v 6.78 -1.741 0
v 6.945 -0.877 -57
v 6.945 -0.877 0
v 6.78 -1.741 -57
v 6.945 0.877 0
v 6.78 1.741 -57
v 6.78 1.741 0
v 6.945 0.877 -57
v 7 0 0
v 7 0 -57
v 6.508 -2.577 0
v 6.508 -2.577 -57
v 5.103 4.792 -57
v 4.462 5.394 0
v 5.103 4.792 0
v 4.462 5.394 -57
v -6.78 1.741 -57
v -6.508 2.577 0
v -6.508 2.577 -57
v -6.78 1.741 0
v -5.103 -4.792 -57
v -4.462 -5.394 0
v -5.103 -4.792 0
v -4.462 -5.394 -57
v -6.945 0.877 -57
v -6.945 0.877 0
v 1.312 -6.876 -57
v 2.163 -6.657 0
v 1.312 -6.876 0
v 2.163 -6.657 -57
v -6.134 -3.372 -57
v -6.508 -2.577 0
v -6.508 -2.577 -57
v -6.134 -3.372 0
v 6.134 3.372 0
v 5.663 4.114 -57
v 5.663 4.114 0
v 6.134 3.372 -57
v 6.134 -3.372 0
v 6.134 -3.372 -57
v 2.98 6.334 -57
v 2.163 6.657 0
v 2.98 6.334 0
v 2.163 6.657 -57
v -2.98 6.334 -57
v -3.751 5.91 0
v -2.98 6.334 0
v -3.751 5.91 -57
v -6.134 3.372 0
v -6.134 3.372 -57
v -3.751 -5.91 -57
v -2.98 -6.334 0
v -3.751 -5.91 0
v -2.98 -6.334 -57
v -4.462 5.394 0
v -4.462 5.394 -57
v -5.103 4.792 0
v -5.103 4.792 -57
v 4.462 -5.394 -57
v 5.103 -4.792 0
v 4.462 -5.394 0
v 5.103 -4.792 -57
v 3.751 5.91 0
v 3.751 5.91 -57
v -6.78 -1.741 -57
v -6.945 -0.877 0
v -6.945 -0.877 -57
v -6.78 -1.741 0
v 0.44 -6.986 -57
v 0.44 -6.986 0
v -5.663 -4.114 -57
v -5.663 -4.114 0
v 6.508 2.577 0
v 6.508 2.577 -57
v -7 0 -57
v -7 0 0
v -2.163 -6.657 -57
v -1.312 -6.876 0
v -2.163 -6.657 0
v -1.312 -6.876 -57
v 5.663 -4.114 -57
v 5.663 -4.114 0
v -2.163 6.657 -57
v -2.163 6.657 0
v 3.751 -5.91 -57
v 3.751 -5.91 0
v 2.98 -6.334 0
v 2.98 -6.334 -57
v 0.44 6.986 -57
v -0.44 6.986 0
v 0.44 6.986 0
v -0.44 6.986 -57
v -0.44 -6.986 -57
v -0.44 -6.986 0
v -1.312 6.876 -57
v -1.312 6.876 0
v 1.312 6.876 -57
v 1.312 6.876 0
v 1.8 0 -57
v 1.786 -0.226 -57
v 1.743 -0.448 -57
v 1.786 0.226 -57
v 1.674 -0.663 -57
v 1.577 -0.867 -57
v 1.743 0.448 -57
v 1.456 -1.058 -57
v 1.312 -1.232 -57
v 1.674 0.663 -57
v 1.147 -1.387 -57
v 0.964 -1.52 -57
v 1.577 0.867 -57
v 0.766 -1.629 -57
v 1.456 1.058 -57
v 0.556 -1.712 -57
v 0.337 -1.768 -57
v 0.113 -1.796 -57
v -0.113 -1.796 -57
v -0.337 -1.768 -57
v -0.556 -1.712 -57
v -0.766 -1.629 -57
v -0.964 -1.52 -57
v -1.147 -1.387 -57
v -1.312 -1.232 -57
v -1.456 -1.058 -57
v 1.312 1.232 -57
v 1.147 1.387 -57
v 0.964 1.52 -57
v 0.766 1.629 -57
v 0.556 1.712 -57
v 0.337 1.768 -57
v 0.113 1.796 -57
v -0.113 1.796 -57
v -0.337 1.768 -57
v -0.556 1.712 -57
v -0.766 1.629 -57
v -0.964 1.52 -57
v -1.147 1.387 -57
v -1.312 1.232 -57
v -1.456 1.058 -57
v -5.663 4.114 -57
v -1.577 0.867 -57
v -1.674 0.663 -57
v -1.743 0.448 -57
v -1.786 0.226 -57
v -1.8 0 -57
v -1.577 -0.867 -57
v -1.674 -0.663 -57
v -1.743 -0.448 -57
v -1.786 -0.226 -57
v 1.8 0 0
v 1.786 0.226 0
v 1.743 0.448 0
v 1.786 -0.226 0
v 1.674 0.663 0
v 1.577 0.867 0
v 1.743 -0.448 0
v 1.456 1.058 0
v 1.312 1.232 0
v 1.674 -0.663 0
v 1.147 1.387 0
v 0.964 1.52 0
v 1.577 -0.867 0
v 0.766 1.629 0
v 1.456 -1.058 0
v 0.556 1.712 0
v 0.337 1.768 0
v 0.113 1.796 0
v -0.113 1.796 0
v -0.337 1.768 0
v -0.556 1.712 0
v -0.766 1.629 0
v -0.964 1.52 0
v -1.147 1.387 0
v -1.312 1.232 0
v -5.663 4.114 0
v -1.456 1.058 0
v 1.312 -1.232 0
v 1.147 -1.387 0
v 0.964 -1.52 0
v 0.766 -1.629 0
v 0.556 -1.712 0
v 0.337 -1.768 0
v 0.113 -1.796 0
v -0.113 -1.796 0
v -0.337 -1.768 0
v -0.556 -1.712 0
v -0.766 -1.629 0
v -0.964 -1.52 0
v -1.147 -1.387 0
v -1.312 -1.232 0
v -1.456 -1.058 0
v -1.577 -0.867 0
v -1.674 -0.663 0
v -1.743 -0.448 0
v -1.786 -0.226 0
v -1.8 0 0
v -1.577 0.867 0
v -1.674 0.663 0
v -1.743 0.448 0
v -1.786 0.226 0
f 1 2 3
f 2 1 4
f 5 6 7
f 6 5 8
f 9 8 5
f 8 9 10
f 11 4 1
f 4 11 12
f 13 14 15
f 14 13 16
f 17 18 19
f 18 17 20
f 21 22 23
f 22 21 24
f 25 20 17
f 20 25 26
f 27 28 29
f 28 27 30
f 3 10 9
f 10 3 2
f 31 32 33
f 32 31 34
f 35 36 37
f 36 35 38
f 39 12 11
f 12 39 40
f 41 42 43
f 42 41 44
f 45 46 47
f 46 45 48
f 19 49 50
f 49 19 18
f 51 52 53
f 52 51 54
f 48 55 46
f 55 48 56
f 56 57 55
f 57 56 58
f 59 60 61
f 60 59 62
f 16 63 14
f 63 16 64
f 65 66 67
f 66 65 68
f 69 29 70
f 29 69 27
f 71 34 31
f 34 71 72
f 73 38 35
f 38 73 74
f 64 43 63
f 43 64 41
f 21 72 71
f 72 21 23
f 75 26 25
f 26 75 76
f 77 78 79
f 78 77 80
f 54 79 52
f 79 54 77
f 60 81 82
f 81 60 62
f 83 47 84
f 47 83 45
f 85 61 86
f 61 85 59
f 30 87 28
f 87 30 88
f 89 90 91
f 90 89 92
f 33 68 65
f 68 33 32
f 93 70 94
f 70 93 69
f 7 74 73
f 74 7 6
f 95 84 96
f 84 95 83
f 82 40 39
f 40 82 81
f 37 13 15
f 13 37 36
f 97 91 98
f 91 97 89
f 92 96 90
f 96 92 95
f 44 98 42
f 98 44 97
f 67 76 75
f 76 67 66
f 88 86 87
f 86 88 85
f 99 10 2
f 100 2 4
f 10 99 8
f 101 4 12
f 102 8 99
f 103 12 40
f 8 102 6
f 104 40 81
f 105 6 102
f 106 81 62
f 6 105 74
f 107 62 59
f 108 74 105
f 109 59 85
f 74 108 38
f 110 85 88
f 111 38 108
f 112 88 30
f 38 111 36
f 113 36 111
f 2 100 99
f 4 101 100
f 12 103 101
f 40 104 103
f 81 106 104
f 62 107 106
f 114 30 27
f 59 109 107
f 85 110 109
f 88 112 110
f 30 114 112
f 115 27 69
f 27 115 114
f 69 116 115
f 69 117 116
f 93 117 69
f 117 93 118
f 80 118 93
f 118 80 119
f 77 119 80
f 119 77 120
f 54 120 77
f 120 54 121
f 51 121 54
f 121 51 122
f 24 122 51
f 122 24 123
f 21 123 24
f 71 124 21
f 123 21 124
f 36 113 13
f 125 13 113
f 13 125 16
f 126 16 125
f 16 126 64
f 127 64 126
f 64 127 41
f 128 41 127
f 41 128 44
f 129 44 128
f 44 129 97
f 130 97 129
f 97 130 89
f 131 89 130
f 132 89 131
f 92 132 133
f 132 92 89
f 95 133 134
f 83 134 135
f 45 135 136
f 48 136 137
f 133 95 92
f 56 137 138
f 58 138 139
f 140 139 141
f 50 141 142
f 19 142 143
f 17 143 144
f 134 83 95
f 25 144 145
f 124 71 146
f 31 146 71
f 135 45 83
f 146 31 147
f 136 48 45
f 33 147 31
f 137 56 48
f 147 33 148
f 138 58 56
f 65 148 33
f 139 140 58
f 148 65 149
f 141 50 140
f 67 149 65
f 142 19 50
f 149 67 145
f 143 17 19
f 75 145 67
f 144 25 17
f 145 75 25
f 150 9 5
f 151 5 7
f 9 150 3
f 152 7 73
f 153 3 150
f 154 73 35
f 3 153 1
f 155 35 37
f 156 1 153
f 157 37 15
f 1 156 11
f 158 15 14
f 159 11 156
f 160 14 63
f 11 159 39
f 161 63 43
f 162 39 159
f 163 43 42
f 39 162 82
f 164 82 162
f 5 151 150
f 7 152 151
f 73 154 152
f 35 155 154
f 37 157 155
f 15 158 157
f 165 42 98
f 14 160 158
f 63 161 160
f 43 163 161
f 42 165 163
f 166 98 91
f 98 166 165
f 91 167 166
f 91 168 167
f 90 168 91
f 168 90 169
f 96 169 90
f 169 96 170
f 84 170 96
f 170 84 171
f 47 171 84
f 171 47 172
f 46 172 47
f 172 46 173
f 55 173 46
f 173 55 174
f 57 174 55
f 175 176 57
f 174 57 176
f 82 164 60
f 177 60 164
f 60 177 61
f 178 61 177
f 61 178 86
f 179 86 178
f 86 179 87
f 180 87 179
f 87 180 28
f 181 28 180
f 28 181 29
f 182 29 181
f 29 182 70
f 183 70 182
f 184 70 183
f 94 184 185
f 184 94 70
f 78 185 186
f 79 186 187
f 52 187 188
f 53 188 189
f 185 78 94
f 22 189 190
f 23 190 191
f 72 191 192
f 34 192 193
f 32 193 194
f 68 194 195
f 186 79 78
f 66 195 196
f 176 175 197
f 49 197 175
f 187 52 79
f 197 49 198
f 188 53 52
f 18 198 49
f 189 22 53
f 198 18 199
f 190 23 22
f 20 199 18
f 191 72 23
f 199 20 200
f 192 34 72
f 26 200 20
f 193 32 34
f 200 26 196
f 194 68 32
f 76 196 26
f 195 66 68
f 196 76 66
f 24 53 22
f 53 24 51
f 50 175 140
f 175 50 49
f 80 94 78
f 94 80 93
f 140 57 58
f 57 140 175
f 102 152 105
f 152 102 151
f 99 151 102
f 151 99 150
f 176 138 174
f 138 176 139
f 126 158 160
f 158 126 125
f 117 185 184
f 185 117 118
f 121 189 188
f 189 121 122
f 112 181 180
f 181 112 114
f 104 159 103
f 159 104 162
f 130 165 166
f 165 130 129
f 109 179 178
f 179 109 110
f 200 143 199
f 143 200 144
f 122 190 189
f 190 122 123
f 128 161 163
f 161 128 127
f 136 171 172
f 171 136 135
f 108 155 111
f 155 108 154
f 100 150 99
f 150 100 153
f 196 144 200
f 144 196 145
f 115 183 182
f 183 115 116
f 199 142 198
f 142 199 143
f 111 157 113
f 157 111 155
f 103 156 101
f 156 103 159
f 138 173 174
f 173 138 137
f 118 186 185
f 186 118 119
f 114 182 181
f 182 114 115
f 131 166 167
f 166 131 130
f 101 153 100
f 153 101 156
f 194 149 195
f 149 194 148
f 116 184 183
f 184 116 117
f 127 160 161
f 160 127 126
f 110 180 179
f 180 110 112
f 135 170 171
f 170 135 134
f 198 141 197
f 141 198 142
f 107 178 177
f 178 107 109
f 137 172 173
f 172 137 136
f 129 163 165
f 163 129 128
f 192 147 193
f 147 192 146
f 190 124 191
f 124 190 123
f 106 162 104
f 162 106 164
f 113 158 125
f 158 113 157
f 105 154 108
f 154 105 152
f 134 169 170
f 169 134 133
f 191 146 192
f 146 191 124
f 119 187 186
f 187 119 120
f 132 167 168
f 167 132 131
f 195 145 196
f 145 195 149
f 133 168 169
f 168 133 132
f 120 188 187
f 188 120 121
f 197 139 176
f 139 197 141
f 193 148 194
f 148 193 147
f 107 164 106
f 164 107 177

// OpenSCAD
$fn = 50;


difference() {
	union() {
		translate(v = [0, 0, -57.0000000000]) {
			cylinder(h = 57, r = 7.0000000000);
		}
		cylinder(h = 0, r = 13.0000000000);
	}
	union() {
		#translate(v = [0, 0, -57]) {
			cylinder(h = 57, r = 1.8000000000);
		}
	}
}
